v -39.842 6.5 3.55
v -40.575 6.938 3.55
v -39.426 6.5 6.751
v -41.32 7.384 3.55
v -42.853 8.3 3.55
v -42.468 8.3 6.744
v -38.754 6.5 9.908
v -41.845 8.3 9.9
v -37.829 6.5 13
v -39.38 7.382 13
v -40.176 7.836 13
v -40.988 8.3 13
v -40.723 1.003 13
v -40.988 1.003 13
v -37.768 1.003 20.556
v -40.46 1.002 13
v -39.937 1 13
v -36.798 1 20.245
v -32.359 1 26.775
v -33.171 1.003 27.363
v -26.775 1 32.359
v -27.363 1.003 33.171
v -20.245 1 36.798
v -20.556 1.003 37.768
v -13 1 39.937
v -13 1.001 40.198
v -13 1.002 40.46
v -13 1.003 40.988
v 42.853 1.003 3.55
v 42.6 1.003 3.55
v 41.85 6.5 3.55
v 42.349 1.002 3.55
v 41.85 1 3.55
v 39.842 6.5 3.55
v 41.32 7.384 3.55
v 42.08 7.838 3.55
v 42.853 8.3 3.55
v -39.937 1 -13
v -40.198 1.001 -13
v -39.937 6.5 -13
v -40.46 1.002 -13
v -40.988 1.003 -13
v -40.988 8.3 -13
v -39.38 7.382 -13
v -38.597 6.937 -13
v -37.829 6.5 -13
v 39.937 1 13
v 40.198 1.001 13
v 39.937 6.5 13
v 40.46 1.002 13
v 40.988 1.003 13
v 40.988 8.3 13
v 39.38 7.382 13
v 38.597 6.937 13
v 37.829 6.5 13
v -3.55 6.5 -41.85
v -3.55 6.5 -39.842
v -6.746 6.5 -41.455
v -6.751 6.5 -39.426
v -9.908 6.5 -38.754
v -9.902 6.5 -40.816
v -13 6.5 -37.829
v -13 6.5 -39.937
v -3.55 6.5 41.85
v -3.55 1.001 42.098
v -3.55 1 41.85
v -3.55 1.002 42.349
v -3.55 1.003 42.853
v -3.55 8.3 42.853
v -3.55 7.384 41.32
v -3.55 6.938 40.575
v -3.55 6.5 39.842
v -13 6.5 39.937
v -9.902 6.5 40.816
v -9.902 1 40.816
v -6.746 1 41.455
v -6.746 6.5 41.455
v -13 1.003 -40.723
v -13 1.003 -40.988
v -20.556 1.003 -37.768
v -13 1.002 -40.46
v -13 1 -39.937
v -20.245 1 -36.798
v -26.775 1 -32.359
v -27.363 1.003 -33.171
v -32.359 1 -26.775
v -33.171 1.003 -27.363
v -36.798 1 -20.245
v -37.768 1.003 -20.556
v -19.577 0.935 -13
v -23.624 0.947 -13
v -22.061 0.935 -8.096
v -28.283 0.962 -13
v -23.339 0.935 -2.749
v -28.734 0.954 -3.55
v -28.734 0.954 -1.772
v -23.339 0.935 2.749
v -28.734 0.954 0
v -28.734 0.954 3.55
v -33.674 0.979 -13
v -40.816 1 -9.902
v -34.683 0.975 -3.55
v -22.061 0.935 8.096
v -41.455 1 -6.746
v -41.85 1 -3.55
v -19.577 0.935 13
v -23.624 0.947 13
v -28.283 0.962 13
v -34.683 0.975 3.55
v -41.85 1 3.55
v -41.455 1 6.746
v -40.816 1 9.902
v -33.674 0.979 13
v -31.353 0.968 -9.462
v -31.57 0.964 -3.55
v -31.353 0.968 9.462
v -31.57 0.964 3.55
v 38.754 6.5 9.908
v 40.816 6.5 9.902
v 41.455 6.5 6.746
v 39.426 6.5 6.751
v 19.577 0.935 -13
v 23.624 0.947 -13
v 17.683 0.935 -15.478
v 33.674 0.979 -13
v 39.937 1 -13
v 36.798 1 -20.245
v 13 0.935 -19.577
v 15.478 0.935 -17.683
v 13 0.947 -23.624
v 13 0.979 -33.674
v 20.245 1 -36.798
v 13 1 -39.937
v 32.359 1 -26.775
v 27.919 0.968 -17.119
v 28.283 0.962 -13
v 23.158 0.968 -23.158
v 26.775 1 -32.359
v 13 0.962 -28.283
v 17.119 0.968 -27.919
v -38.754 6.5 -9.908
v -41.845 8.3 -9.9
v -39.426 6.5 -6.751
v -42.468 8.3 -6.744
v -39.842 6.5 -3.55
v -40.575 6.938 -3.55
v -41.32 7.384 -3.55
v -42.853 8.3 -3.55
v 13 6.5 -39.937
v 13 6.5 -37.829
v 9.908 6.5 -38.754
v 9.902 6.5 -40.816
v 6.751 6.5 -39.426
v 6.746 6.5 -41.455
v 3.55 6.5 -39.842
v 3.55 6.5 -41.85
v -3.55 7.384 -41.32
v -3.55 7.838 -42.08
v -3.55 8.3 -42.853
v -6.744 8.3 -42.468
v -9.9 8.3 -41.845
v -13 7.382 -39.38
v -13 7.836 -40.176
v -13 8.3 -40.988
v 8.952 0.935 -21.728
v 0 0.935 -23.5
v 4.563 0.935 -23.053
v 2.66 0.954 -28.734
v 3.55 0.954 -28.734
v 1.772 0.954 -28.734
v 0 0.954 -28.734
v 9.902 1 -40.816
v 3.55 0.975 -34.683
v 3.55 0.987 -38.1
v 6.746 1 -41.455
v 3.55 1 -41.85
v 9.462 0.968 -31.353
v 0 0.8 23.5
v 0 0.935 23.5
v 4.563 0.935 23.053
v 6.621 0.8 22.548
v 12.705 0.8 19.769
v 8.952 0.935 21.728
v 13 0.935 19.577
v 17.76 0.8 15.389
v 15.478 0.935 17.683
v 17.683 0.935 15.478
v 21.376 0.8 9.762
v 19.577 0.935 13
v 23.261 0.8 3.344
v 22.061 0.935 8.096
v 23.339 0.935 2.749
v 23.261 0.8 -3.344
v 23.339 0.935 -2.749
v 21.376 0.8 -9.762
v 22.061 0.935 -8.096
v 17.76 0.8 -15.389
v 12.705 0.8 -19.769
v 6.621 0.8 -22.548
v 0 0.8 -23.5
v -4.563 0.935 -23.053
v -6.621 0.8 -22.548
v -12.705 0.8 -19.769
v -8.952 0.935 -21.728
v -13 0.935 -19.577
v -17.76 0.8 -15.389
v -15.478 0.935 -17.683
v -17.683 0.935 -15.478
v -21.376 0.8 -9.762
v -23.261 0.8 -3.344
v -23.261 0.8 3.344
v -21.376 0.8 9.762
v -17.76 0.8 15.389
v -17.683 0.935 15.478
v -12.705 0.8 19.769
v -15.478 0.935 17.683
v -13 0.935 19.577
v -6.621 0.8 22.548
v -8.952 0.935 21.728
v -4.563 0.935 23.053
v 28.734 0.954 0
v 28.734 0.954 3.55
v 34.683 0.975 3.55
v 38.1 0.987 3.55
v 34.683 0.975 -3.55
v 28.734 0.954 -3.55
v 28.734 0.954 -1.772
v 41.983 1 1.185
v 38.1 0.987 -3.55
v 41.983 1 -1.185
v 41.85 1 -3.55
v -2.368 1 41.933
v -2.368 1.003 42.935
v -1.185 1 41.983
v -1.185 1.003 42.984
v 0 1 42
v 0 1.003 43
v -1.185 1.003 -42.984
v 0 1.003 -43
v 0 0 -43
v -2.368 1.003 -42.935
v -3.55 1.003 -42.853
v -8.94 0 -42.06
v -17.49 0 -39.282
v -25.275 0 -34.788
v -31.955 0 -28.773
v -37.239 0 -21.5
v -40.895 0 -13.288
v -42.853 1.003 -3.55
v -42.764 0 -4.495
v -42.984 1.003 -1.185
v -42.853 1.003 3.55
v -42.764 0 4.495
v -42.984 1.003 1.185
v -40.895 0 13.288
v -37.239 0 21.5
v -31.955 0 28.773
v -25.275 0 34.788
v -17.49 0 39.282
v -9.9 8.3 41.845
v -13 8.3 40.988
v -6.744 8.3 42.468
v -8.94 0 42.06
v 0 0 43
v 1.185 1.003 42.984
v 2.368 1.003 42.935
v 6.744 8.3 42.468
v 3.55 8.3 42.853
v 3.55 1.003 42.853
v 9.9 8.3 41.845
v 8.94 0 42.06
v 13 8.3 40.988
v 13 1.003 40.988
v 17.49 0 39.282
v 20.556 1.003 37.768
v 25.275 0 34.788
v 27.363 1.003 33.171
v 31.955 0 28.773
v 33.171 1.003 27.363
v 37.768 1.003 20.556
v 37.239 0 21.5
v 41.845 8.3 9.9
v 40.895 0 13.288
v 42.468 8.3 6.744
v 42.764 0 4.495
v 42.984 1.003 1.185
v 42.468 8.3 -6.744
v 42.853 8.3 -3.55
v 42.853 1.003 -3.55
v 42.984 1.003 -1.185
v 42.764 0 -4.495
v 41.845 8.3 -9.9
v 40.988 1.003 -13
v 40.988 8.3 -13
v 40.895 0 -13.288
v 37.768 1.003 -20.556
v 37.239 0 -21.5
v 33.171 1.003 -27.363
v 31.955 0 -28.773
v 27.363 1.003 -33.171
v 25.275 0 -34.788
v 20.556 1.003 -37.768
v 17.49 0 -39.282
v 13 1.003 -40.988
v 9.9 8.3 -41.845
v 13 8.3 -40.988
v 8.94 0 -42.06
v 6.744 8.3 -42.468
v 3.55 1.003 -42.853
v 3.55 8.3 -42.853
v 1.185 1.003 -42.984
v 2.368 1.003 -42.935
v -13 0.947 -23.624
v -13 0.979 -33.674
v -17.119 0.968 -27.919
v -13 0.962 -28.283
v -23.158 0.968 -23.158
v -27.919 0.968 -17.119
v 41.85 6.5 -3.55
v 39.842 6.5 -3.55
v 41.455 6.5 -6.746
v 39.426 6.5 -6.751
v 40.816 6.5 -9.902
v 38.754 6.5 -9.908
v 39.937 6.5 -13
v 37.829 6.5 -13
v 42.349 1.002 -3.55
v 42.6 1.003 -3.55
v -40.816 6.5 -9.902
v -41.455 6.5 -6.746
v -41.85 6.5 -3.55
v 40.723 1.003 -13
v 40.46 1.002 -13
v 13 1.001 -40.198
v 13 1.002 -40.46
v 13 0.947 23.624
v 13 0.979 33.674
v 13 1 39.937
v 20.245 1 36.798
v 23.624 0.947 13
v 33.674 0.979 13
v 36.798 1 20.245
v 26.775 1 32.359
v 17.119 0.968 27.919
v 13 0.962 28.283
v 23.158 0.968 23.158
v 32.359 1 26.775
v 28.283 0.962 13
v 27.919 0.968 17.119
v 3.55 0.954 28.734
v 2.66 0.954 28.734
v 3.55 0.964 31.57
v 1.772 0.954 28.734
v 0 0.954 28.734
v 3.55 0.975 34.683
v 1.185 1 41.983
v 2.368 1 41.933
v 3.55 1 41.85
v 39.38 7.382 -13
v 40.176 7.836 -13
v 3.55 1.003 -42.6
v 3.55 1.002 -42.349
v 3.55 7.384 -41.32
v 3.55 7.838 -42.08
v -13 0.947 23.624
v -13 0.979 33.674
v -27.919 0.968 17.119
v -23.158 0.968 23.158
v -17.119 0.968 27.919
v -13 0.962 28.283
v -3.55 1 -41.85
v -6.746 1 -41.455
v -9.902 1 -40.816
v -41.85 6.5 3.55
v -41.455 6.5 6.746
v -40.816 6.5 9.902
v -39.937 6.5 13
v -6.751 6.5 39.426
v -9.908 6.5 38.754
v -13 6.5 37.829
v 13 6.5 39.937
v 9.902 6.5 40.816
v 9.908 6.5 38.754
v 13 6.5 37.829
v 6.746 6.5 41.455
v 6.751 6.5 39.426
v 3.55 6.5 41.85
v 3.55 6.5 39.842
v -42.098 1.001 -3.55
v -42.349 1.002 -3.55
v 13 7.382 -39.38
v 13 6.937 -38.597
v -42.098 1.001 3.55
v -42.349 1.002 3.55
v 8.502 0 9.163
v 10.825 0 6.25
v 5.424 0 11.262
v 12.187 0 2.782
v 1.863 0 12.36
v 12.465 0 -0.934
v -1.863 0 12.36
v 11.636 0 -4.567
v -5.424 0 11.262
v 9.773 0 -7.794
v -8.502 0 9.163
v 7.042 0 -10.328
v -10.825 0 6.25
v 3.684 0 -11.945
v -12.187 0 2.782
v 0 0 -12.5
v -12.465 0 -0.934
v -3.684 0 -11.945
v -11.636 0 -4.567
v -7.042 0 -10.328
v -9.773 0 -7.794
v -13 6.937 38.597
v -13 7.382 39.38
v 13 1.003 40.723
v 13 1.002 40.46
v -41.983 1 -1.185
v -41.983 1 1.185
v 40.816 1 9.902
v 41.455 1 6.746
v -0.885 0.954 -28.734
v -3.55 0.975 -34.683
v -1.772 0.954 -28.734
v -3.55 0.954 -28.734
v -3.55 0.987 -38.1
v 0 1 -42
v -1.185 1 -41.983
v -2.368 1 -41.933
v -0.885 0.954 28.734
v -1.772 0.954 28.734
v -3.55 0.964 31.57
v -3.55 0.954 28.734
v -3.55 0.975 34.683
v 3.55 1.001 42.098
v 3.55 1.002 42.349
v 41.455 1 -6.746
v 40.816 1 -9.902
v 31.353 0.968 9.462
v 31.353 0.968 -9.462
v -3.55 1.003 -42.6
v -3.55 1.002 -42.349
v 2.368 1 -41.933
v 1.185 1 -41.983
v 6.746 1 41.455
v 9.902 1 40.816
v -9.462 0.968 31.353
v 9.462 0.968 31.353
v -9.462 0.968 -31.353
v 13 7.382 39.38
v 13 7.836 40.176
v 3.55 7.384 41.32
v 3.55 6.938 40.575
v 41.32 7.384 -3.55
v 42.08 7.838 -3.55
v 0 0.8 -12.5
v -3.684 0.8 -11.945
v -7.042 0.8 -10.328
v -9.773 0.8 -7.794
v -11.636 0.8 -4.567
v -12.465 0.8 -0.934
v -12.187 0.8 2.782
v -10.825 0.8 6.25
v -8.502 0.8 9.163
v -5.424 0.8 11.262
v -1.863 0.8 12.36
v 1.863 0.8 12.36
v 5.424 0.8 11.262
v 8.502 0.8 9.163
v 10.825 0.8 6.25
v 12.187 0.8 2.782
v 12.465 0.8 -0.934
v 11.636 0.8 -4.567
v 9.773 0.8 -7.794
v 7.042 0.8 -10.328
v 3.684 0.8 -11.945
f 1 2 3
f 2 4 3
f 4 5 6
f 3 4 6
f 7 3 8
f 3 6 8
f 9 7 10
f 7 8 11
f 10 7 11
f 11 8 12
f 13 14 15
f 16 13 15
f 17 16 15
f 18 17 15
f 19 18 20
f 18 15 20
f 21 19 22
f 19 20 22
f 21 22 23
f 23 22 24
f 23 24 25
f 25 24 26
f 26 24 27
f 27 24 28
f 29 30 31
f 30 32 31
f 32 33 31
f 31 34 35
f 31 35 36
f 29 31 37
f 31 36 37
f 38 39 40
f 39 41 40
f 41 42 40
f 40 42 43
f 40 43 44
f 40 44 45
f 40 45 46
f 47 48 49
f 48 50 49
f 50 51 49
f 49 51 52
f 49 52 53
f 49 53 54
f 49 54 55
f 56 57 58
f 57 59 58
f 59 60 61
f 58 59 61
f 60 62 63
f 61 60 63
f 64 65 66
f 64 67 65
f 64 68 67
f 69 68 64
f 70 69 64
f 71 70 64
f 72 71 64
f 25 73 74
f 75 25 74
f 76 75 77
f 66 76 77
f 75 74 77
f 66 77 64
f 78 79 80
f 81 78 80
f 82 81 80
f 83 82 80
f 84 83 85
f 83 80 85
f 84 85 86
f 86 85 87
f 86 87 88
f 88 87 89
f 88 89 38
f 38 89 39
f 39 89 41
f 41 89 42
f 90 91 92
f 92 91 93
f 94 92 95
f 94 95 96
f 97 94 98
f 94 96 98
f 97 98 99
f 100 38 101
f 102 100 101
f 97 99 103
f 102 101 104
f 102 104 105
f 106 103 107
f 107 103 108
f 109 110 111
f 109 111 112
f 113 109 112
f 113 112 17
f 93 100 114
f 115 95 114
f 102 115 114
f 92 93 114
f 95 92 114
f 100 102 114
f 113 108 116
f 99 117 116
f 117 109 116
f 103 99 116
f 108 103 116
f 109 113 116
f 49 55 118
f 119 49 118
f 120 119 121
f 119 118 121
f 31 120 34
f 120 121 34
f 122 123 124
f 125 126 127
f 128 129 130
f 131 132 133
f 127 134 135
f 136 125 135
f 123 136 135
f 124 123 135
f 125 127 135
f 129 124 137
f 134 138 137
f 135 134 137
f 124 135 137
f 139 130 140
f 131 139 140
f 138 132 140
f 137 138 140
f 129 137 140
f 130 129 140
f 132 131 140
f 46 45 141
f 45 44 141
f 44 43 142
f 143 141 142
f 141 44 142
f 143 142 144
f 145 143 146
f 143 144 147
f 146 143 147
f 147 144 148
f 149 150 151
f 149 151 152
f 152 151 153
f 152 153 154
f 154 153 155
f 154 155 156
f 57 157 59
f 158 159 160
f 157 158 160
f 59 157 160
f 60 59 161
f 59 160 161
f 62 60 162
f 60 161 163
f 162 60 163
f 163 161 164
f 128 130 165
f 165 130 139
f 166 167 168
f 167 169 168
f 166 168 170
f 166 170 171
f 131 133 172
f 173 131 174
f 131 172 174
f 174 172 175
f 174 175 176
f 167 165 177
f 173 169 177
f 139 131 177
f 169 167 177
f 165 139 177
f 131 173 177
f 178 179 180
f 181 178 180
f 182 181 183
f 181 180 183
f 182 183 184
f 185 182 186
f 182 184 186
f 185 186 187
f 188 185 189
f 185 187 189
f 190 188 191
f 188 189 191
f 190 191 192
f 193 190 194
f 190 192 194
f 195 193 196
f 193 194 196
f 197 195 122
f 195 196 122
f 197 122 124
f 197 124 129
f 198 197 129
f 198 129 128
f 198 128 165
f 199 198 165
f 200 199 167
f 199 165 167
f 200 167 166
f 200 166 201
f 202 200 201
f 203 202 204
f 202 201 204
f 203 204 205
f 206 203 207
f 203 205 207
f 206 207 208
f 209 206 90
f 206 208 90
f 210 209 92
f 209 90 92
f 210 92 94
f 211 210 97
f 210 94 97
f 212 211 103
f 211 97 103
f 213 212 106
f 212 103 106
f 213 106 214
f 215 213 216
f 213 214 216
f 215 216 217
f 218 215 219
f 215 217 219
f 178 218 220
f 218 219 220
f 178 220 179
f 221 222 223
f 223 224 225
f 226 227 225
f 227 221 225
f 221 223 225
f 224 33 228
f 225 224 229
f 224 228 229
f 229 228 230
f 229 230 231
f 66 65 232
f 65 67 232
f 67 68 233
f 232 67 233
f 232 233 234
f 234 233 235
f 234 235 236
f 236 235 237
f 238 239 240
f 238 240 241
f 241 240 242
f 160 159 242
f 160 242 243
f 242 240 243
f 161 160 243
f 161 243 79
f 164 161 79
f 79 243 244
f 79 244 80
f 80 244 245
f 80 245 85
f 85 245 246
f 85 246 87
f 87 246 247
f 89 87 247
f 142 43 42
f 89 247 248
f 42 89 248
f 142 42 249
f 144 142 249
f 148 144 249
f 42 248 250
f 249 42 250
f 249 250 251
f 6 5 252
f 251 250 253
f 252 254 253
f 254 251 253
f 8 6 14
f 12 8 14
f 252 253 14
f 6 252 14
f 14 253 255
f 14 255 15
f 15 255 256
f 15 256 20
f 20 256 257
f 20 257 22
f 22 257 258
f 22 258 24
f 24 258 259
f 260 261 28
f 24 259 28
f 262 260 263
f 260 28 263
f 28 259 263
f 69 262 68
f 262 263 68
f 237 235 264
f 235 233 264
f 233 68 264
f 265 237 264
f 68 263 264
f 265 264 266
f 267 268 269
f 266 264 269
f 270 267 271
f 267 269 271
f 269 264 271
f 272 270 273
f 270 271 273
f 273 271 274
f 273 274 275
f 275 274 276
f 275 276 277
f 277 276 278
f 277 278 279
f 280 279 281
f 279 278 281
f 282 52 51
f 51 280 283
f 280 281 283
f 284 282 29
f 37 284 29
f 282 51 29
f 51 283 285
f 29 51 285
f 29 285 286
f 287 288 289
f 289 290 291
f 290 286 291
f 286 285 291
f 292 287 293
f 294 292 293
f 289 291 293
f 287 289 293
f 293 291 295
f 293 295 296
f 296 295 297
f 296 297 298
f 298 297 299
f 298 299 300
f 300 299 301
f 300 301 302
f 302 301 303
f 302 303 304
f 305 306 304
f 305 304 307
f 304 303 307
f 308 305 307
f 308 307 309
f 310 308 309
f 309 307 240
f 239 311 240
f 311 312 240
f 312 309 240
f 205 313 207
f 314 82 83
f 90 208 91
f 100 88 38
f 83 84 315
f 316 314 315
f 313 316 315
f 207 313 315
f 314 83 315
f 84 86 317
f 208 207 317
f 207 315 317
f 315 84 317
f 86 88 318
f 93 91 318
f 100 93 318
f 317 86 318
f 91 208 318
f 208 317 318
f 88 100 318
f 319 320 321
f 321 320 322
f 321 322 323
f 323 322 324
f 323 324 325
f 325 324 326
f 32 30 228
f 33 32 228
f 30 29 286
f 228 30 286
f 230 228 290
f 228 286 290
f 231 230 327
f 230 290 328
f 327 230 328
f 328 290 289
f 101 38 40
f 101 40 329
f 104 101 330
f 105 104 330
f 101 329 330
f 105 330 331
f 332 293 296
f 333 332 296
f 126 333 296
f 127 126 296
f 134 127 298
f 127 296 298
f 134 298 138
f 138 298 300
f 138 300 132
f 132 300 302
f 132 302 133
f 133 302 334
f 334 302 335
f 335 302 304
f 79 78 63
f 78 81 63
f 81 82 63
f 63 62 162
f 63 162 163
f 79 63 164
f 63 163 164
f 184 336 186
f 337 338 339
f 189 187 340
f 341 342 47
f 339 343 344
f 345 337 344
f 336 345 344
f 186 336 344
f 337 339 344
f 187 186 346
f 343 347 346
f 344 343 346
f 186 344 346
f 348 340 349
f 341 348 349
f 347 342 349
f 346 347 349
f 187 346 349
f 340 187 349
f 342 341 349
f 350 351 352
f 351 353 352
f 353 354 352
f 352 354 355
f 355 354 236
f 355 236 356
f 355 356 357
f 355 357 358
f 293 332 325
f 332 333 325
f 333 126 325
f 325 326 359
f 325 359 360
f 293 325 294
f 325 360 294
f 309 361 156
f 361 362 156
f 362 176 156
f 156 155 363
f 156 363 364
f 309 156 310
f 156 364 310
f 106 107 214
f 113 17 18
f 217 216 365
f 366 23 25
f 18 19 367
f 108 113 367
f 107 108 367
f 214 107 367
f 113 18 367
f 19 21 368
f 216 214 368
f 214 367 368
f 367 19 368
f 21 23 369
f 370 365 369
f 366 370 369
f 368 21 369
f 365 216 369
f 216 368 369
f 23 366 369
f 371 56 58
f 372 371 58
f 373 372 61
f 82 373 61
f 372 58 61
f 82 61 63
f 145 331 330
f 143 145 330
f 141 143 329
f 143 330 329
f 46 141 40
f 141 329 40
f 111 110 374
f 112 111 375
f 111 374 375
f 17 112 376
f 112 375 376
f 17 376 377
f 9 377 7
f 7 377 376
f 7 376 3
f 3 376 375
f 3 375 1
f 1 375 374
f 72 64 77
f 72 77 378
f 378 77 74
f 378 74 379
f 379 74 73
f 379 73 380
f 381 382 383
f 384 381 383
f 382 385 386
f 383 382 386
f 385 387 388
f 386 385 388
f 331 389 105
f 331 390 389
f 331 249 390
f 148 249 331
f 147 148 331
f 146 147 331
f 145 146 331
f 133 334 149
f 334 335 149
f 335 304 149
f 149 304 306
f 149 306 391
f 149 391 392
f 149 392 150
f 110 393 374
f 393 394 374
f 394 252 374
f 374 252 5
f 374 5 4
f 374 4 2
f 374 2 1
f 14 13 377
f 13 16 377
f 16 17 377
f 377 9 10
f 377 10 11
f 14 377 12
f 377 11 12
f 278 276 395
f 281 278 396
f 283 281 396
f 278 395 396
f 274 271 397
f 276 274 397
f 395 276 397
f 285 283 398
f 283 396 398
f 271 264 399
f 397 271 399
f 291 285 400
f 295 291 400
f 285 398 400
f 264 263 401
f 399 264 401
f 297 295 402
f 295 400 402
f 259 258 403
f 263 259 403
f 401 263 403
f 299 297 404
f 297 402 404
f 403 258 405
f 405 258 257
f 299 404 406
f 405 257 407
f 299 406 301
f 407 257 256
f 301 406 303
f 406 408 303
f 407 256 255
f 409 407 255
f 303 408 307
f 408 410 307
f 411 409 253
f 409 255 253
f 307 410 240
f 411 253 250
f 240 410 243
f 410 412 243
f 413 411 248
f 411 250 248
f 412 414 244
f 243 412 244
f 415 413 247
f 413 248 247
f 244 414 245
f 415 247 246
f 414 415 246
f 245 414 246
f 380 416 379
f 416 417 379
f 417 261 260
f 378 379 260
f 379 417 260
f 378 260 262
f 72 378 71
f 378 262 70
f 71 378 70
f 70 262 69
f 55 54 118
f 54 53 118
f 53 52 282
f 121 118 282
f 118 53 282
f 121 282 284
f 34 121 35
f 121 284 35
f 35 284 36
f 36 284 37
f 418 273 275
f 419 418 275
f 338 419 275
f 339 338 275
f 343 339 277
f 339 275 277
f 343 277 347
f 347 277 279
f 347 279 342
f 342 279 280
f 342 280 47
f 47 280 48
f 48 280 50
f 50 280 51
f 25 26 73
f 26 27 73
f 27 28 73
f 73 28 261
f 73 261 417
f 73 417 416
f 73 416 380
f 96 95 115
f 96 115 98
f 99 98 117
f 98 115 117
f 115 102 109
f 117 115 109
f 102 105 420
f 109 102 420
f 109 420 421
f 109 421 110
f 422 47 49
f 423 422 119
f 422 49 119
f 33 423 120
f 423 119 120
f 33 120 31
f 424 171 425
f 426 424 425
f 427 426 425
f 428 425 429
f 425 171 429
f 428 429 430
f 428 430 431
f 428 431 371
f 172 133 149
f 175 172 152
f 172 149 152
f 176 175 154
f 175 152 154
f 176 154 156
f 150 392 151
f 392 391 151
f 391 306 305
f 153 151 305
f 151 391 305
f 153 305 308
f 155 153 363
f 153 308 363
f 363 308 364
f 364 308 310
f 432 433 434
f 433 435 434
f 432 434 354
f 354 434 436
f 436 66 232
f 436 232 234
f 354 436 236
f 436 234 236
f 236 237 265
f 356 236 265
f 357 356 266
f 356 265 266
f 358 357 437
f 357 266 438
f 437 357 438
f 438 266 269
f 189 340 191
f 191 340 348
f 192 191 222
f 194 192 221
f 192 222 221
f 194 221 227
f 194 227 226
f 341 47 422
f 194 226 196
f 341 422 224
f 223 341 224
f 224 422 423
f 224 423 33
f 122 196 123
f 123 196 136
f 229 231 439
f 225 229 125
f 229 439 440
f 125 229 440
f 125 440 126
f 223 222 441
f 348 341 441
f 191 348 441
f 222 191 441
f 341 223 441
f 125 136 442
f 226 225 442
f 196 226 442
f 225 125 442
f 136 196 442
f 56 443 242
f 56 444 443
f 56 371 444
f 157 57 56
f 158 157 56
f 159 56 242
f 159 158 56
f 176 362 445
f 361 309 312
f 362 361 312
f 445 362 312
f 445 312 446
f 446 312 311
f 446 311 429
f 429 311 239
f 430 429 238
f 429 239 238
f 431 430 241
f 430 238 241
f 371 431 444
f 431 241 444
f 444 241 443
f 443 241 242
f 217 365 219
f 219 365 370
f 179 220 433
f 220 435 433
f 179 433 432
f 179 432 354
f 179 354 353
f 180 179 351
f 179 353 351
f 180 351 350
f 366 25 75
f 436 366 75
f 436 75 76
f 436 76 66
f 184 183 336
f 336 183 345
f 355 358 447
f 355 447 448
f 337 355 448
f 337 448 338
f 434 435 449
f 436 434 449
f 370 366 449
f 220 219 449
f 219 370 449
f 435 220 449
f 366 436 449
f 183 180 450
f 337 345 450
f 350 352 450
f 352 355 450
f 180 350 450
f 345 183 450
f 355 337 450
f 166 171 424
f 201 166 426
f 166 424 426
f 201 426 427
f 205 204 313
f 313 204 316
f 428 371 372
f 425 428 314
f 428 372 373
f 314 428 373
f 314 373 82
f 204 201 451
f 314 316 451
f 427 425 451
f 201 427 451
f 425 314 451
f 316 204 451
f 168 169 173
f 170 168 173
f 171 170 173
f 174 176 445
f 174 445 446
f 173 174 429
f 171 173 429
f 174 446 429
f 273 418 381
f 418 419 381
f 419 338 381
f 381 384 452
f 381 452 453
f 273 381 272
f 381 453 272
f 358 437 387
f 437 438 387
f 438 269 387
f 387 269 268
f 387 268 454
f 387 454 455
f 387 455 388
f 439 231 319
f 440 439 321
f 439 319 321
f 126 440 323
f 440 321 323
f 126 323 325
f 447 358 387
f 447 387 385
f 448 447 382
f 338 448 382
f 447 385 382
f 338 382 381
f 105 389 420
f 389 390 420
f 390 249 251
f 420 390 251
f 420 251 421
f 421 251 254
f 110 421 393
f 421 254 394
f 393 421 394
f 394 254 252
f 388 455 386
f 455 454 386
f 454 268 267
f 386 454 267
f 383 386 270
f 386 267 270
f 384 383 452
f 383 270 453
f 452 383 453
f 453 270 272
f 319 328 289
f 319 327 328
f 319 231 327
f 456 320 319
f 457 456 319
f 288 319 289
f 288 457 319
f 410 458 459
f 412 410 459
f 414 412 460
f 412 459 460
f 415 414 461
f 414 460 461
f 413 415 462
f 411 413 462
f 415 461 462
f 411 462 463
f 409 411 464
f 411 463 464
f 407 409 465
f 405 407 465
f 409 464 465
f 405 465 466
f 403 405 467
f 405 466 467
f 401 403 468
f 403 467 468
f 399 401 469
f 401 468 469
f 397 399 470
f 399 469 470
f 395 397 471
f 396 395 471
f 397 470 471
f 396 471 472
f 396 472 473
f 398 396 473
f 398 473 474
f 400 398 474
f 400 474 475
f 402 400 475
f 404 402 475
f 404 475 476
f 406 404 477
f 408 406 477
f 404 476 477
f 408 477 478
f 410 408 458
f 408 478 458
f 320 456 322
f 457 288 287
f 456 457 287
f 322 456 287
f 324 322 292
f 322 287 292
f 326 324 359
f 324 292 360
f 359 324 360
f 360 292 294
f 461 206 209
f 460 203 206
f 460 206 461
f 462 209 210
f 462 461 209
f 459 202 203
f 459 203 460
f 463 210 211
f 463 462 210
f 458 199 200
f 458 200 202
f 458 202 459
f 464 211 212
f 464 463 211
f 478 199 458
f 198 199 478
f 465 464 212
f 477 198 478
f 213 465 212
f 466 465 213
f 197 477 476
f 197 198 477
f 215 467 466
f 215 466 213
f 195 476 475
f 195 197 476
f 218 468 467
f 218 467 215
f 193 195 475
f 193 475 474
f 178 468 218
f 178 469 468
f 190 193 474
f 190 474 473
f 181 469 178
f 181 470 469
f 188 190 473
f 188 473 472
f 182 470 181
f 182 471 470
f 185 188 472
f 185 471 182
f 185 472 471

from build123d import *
from build123d.topology import SkipClean

# Parameters (mm, degrees)
CUT_EXTRUDE_1_REACH = 63.375
SKETCH_3_W          = 7.1
SKETCH_3_H          = 24.266407169
SKETCH_3_W_2        = 24.266407169
SKETCH_3_H_2        = 7.1
SKETCH_4_R          = 23.5
CUT_EXTRUDE_2_DEPTH = 7.5


with BuildPart() as part:
    # Эскиз2 → Повернуть1 (revolve)
    with BuildSketch(Plane.XY, mode=Mode.PRIVATE) as revolve_1_sk:
        Polygon((12.5, 0), (12.5, 0.896852554), (42, 1), (42, 6.5), (40, 6.5), (43, 8.3), (43, 0), align=None)
    revolve(revolve_1_sk.sketch.rotate(Axis((0, -20.602437041, 0), (0, 1, 0)), 90), axis=Axis((0, -20.602437041, 0), (0, 1, 0)))

    # Вырез-Вытянуть1: up to this cone (the profile starts inside it)
    with SkipClean():  # the faces are left unmerged after this step: merging them gives an invalid solid
        cut_extrude_1_end = Plane(origin=(0, 8.3, 0), z_dir=(0, 1, 0)).offset(-7.446852991) * Cone(0.000285998, 629513.797627356, 2201.109848989, align=(Align.CENTER, Align.CENTER, Align.MIN), mode=Mode.PRIVATE)
        # Эскиз3 → Вырез-Вытянуть1 (cut, up to the surface)
        with BuildSketch(Plane(origin=(0, 8.3, 0), x_dir=(1, 0, 0), z_dir=(0, 1, 0)), mode=Mode.PRIVATE) as cut_extrude_1_sk1:
            Polygon((-13, -13), (-53, -13), (-13, -53), align=None)
        cut_extrude_1_tool1 = extrude(cut_extrude_1_sk1.sketch, amount=-CUT_EXTRUDE_1_REACH, mode=Mode.PRIVATE) & cut_extrude_1_end
        add(cut_extrude_1_tool1.solids().sort_by_distance((-26.333333, 8.3, 26.333333))[0], mode=Mode.SUBTRACT)
        # Эскиз3 → Вырез-Вытянуть1 (cut, up to the surface)
        with BuildSketch(Plane(origin=(0, 8.3, 0), x_dir=(1, 0, 0), z_dir=(0, 1, 0)), mode=Mode.PRIVATE) as cut_extrude_1_sk2:
            Polygon((-13, 13), (-13, 53), (-53, 13), align=None)
        cut_extrude_1_tool2 = extrude(cut_extrude_1_sk2.sketch, amount=-CUT_EXTRUDE_1_REACH, mode=Mode.PRIVATE) & cut_extrude_1_end
        add(cut_extrude_1_tool2.solids().sort_by_distance((-26.333333, 8.3, -26.333333))[0], mode=Mode.SUBTRACT)
        # Эскиз3 → Вырез-Вытянуть1 (cut, up to the surface)
        with BuildSketch(Plane(origin=(0, 8.3, 0), x_dir=(1, 0, 0), z_dir=(0, 1, 0)), mode=Mode.PRIVATE) as cut_extrude_1_sk3:
            Polygon((13, 13), (53, 13), (13, 53), align=None)
        cut_extrude_1_tool3 = extrude(cut_extrude_1_sk3.sketch, amount=-CUT_EXTRUDE_1_REACH, mode=Mode.PRIVATE) & cut_extrude_1_end
        add(cut_extrude_1_tool3.solids().sort_by_distance((26.333333, 8.3, -26.333333))[0], mode=Mode.SUBTRACT)
        # Эскиз3 → Вырез-Вытянуть1 (cut, up to the surface)
        with BuildSketch(Plane(origin=(0, 8.3, 0), x_dir=(1, 0, 0), z_dir=(0, 1, 0)), mode=Mode.PRIVATE) as cut_extrude_1_sk4:
            Polygon((13, -13), (13, -53), (53, -13), align=None)
        cut_extrude_1_tool4 = extrude(cut_extrude_1_sk4.sketch, amount=-CUT_EXTRUDE_1_REACH, mode=Mode.PRIVATE) & cut_extrude_1_end
        add(cut_extrude_1_tool4.solids().sort_by_distance((26.333333, 8.3, 26.333333))[0], mode=Mode.SUBTRACT)
        # Эскиз3 → Вырез-Вытянуть1 (cut, up to the surface)
        with BuildSketch(Plane(origin=(0, 8.3, 0), x_dir=(1, 0, 0), z_dir=(0, 1, 0)), mode=Mode.PRIVATE) as cut_extrude_1_sk5:
            with Locations((0, 40.866796416)):
                Rectangle(SKETCH_3_W, SKETCH_3_H)
        cut_extrude_1_tool5 = extrude(cut_extrude_1_sk5.sketch, amount=-CUT_EXTRUDE_1_REACH, mode=Mode.PRIVATE) & cut_extrude_1_end
        add(cut_extrude_1_tool5.solids().sort_by_distance((0, 8.3, -40.866796))[0], mode=Mode.SUBTRACT)
        # Эскиз3 → Вырез-Вытянуть1 (cut, up to the surface)
        with BuildSketch(Plane(origin=(0, 8.3, 0), x_dir=(1, 0, 0), z_dir=(0, 1, 0)), mode=Mode.PRIVATE) as cut_extrude_1_sk6:
            with Locations((-40.866796416, 0)):
                Rectangle(SKETCH_3_W_2, SKETCH_3_H_2)
        cut_extrude_1_tool6 = extrude(cut_extrude_1_sk6.sketch, amount=-CUT_EXTRUDE_1_REACH, mode=Mode.PRIVATE) & cut_extrude_1_end
        add(cut_extrude_1_tool6.solids().sort_by_distance((-40.866796, 8.3, 0))[0], mode=Mode.SUBTRACT)
        # Эскиз3 → Вырез-Вытянуть1 (cut, up to the surface)
        with BuildSketch(Plane(origin=(0, 8.3, 0), x_dir=(1, 0, 0), z_dir=(0, 1, 0)), mode=Mode.PRIVATE) as cut_extrude_1_sk7:
            with Locations((40.866796416, 0)):
                Rectangle(SKETCH_3_W_2, SKETCH_3_H_2)
        cut_extrude_1_tool7 = extrude(cut_extrude_1_sk7.sketch, amount=-CUT_EXTRUDE_1_REACH, mode=Mode.PRIVATE) & cut_extrude_1_end
        add(cut_extrude_1_tool7.solids().sort_by_distance((40.866796, 8.3, 0))[0], mode=Mode.SUBTRACT)
        # Эскиз3 → Вырез-Вытянуть1 (cut, up to the surface)
        with BuildSketch(Plane(origin=(0, 8.3, 0), x_dir=(1, 0, 0), z_dir=(0, 1, 0)), mode=Mode.PRIVATE) as cut_extrude_1_sk8:
            with Locations((0, -40.866796416)):
                Rectangle(SKETCH_3_W, SKETCH_3_H)
        cut_extrude_1_tool8 = extrude(cut_extrude_1_sk8.sketch, amount=-CUT_EXTRUDE_1_REACH, mode=Mode.PRIVATE) & cut_extrude_1_end
        add(cut_extrude_1_tool8.solids().sort_by_distance((0, 8.3, 40.866796))[0], mode=Mode.SUBTRACT)

    # Эскиз4 → Вырез-Вытянуть2 (cut)
    with SkipClean():  # the faces are left unmerged after this step: merging them gives an invalid solid
        with BuildSketch(Plane(origin=(0, 8.3, 0), x_dir=(1, 0, 0), z_dir=(0, 1, 0))):
            with Locations(Location((0, 0, 0), (0, 0, 270))):
                Circle(SKETCH_4_R)
        extrude(amount=-CUT_EXTRUDE_2_DEPTH, mode=Mode.SUBTRACT)


solid = part.part
